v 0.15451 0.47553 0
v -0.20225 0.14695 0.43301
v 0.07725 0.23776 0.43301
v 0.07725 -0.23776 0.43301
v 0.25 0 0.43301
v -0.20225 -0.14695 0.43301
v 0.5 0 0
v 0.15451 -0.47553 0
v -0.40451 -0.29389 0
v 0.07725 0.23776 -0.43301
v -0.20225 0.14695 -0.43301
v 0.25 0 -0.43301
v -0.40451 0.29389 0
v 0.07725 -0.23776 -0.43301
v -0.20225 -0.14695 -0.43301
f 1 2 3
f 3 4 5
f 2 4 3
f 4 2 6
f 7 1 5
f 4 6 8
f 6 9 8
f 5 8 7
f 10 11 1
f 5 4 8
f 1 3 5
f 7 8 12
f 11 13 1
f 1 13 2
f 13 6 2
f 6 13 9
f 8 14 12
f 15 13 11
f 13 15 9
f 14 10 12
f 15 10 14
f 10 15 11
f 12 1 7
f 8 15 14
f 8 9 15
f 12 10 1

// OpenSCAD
// Library: round-anything
// Version: 1.0
// Author: IrevDev
// Copyright: 2017
// License: GPL 3
test();

 //callExamples(); //uncomment to view examples
module test()
{
p=[for(i=[0:5])[rnd(0,100),rnd(0,100) ]];
po=[for(i=[0:len(p)-1])[p[i].x,p[i].y]];
pr=let(Lp1=len(p)-1)[for(i=[0:Lp1])min(10,  0.125*  spread(p[ wrap(i-1,Lp1+1)],p[i],p[ wrap(i+1,Lp1+1)]))];
R=polyRound(po,pr,5);
 polyline(R); 
%polyline(po);
echo([po]);
echo([pr]);
}

function spread(p1,p2,p3)=min(
point_to_line(p3,p1,p2)
,
point_to_line(p1,p2,p3)
);
function point_to_line(p,a,b)=
let(
pa = p - a, 
ba = b - a,
h = clamp( (pa*ba)/ (ba*ba)))
norm( pa - ba*h ) ;
function clamp(a, b = 0, c = 1) = min(max(a, b), c); 
function wrap(x,x_max=1,x_min=0) = (((x - x_min) % (x_max - x_min)) + (x_max - x_min)) % (x_max - x_min) + x_min;
function rnd(a = 1, b = 0, s = []) = 
  s == [] ? 
   (rands(min(a, b), max(   a, b), 1)[0]) 
  : 
   (rands(min(a, b), max(a, b), 1, s)[0])
  ; 
module callExamples(){
    //Example of how a parametric part might be designed with this tool 
    width=20;       height=25;
    slotW=8;        slotH=15;
    slotPosition=8;
    minR=1.5;       farcornerR=6;
    internalR=3;
    points=[[0,0],[0,height],[slotPosition,height],[slotPosition,height-slotH],
    [slotPosition+slotW,height-slotH],[slotPosition+slotW,height],[width,height],[width,0]];
    radiuses=[minR,minR,minR,internalR,internalR,minR,minR,farcornerR];
    translate([-30,0,0])polygon(polyRound(points,radiuses));
    %translate([-30,0,0.2])polygon(points);
    
    //Example of features 2
    //   1     2     3      4      5       6     
    b=[[-5,0],[5,3],[0,7],[8,7],[20,20],[10,0]]; //points
    br=[1,     1.5,   0,   10,     1,     10]; //radiuses
    polygon(polyRound(b,br,15));
    %translate([0,0,0.2])polygon(b);
    
    
    //Example of features 3
    //   1     2       3      4       5     6
    p=[[0,0],[0,20],[15,15],[3,10],[15,0],[6,2]];//points
    pr=[1,     1,      0,     3,      1,   10];//radiuses
    translate([25,0,0])polygon(polyRound(p,pr,30));
    %translate([25,0,0.2])polygon(p);
}


function polyRound(p,r,fn=5)=
    //turns the orginal array in (last element, array, first element) since the points are processed 3 at a time.
    let(Lp1=len(p)-1,temp=[for(i=[0:len(p)-1]) 
round3points(
p[wrap(i-1,Lp1+1)],
p[wrap(i+0,Lp1+1)],
p[wrap(i+1,Lp1+1)],
r[wrap(i,Lp1+1)],
fn)])//passes three points at a time to polyRound()
    //temp ends up being a 3 dimensional array where each arc is grouped together, so the below code breaks it up and turns it back into a 2d array, ie list of coordinates (is there a better way of doing this? a way to stop it from becomeing a 3d array in the first place?
    [for(i=temp ) i];

function round3points(p1,p2,p3,r,fn)=
    let(e1=(p2[0]-p1[0])*(p2[1]+p1[1]))//edge 1
    let(e2=(p3[0]-p2[0])*(p3[1]+p2[1]))//edge 2
    let(e3=(p1[0]-p3[0])*(p1[1]+p3[1]))//edge 3
    let(CWorCCW=(e1+e2+e3)/abs(e1+e2+e3))//rotation of the three points cw or ccw?
let(err=echo(CWorCCW))
     dot(un(p1-p2),(p2-p3))>0.98?[p2 ]
    : 
    let(ang=cosineRuleAngle(p1,p2,p3))//angle between the lines
    let(tangD=r/tan(ang/2))//distance to the tangent point from p2
    let(circD=r/sin(ang/2))//distance to the circle centre from p2
    let(a12=abs(atan(getGradient(p1,p2))))//angle of line 1
    let(a23=abs(atan(getGradient(p2,p3))))//angle of line 2
    
    let(vec21=p1-p2)//vector from p2 to p1
    let(vec23=p3-p2)//vector from p2 to p3
    let(dir21x=vec21[0]==0?0:vec21[0]/abs(vec21[0]))//tangent along line p2 to p1 x polerisation. Returns 1,-1 or 0
    let(dir21y=vec21[1]==0?0:vec21[1]/abs(vec21[1]))//tangent along line p2 to p1 y polerisation. Returns 1,-1 or 0
    let(dir23x=vec23[0]==0?0:vec23[0]/abs(vec23[0]))//tangent along line p3 to p1 x polerisation. Returns 1,-1 or 0
    let(dir23y=vec23[1]==0?0:vec23[1]/abs(vec23[1]))//tangent along line p3 to p1 Y polerisation. Returns 1,-1 or 0
    
    let(t12=[p2[0]+dir21x*cos(a12)*tangD,p2[1]+dir21y*sin(a12)*tangD])//tangent point along line p2 to p2 by offseting from p2
    let(t23=[p2[0]+dir23x*cos(a23)*tangD,p2[1]+dir23y*sin(a23)*tangD])//tangent point along line p2 to p3 by offseting from p2
    
    let(vec_=getMidpoint(t12,t23)-p2)//vector from P1 to the midpoint of the two tangents
    let(dirx_=vec_[0]==0?0:vec_[0]/abs(vec_[0]))//circle center point x polerisation
    let(diry_=vec_[1]==0?0:vec_[1]/abs(vec_[1]))//circle center point y polerisation
    let(a_=abs(atan(getGradient(getMidpoint(t12,t23),p2))))//angle of line from tangent midpoints to p2
    let(cen=[p2[0]+dirx_*cos(a_)*circD,p2[1]+diry_*sin(a_)*circD])//circle center by offseting from p2
    
    let(e1=(p2[0]-p1[0])*(p2[1]+p1[1]))//edge 1
    let(e2=(p3[0]-p2[0])*(p3[1]+p2[1]))//edge 2
    let(e3=(p1[0]-p3[0])*(p1[1]+p3[1]))//edge 3
    let(CWorCCW=(e1+e2+e3)/abs(e1+e2+e3))//rotation of the three points cw or ccw?
   CentreN2PointsArc(t12,t23,cen,CWorCCW,fn);
function dot (a,b)=a*b; // dotproduct is impied in * of vextoes

function un(v)=v/max(norm(v),1e-16);
        
function CentreN2PointsArc(p1,p2,cen,CWorCCW,fn)=
    let(r=pointDist(p1,cen))
    let(CircA1=invtan(p1[0]-cen[0],p1[1]-cen[1]))//angle of line 1
    let(CircA2=cosineRuleAngle(p2,cen,p1))//angle between the lines
    [for(i=[0:fn]) [cos(CircA1+(CircA2/fn)*-i*CWorCCW)*r+cen[0],sin(CircA1+(CircA2/fn)*-i*CWorCCW)*r+cen[1]]];
 
function invtan(run,rise)=
    let(a=abs(atan(rise/run)))
    rise==0&&run>0?0:rise>0&&run>0?a:rise>0&&run==0?90:rise>0&&run<0?180-a:rise==0&&run<0?180:rise<0&&run<0?a+180:rise<0&&run==0?270:rise<0&&run>0?360-a:"error";

function cosineRuleAngle(p1,p2,p3)=
    let(p12=abs(pointDist(p1,p2)))
    let(p13=abs(pointDist(p1,p3)))
    let(p23=abs(pointDist(p2,p3)))
    acos((sq(p23)+sq(p12)-sq(p13))/(2*p23*p12));
    
function getIntersect(m1,m2,k1,k2)=
    let(x=(k2-k1)/(m1-m2))
    let(y=m1*x+k1)
    [x,y];

function sq(x)=x*x;
function getGradient(p1,p2)=(p2[1]-p1[1])/(p2[0]-p1[0]);
function getConstant(p,m)=p[1]-m*p[0];
function getMidpoint(p1,p2)=[(p1[0]+p2[0])/2,(p1[1]+p2[1])/2];
function pointDist(p1,p2)=sqrt(abs(sq(p1[0]-p2[0])+sq(p1[1]-p2[1])));
 module polyline(p) {for(i=[0:max(0,len(p)-1)])line(p[i],p[wrap(i+1,len(p) )]);
}

module line(p1, p2 ,width=0.5) 
{
    hull() {
        translate(p1) sphere(width);
        translate(p2) sphere(width);
    }
}
